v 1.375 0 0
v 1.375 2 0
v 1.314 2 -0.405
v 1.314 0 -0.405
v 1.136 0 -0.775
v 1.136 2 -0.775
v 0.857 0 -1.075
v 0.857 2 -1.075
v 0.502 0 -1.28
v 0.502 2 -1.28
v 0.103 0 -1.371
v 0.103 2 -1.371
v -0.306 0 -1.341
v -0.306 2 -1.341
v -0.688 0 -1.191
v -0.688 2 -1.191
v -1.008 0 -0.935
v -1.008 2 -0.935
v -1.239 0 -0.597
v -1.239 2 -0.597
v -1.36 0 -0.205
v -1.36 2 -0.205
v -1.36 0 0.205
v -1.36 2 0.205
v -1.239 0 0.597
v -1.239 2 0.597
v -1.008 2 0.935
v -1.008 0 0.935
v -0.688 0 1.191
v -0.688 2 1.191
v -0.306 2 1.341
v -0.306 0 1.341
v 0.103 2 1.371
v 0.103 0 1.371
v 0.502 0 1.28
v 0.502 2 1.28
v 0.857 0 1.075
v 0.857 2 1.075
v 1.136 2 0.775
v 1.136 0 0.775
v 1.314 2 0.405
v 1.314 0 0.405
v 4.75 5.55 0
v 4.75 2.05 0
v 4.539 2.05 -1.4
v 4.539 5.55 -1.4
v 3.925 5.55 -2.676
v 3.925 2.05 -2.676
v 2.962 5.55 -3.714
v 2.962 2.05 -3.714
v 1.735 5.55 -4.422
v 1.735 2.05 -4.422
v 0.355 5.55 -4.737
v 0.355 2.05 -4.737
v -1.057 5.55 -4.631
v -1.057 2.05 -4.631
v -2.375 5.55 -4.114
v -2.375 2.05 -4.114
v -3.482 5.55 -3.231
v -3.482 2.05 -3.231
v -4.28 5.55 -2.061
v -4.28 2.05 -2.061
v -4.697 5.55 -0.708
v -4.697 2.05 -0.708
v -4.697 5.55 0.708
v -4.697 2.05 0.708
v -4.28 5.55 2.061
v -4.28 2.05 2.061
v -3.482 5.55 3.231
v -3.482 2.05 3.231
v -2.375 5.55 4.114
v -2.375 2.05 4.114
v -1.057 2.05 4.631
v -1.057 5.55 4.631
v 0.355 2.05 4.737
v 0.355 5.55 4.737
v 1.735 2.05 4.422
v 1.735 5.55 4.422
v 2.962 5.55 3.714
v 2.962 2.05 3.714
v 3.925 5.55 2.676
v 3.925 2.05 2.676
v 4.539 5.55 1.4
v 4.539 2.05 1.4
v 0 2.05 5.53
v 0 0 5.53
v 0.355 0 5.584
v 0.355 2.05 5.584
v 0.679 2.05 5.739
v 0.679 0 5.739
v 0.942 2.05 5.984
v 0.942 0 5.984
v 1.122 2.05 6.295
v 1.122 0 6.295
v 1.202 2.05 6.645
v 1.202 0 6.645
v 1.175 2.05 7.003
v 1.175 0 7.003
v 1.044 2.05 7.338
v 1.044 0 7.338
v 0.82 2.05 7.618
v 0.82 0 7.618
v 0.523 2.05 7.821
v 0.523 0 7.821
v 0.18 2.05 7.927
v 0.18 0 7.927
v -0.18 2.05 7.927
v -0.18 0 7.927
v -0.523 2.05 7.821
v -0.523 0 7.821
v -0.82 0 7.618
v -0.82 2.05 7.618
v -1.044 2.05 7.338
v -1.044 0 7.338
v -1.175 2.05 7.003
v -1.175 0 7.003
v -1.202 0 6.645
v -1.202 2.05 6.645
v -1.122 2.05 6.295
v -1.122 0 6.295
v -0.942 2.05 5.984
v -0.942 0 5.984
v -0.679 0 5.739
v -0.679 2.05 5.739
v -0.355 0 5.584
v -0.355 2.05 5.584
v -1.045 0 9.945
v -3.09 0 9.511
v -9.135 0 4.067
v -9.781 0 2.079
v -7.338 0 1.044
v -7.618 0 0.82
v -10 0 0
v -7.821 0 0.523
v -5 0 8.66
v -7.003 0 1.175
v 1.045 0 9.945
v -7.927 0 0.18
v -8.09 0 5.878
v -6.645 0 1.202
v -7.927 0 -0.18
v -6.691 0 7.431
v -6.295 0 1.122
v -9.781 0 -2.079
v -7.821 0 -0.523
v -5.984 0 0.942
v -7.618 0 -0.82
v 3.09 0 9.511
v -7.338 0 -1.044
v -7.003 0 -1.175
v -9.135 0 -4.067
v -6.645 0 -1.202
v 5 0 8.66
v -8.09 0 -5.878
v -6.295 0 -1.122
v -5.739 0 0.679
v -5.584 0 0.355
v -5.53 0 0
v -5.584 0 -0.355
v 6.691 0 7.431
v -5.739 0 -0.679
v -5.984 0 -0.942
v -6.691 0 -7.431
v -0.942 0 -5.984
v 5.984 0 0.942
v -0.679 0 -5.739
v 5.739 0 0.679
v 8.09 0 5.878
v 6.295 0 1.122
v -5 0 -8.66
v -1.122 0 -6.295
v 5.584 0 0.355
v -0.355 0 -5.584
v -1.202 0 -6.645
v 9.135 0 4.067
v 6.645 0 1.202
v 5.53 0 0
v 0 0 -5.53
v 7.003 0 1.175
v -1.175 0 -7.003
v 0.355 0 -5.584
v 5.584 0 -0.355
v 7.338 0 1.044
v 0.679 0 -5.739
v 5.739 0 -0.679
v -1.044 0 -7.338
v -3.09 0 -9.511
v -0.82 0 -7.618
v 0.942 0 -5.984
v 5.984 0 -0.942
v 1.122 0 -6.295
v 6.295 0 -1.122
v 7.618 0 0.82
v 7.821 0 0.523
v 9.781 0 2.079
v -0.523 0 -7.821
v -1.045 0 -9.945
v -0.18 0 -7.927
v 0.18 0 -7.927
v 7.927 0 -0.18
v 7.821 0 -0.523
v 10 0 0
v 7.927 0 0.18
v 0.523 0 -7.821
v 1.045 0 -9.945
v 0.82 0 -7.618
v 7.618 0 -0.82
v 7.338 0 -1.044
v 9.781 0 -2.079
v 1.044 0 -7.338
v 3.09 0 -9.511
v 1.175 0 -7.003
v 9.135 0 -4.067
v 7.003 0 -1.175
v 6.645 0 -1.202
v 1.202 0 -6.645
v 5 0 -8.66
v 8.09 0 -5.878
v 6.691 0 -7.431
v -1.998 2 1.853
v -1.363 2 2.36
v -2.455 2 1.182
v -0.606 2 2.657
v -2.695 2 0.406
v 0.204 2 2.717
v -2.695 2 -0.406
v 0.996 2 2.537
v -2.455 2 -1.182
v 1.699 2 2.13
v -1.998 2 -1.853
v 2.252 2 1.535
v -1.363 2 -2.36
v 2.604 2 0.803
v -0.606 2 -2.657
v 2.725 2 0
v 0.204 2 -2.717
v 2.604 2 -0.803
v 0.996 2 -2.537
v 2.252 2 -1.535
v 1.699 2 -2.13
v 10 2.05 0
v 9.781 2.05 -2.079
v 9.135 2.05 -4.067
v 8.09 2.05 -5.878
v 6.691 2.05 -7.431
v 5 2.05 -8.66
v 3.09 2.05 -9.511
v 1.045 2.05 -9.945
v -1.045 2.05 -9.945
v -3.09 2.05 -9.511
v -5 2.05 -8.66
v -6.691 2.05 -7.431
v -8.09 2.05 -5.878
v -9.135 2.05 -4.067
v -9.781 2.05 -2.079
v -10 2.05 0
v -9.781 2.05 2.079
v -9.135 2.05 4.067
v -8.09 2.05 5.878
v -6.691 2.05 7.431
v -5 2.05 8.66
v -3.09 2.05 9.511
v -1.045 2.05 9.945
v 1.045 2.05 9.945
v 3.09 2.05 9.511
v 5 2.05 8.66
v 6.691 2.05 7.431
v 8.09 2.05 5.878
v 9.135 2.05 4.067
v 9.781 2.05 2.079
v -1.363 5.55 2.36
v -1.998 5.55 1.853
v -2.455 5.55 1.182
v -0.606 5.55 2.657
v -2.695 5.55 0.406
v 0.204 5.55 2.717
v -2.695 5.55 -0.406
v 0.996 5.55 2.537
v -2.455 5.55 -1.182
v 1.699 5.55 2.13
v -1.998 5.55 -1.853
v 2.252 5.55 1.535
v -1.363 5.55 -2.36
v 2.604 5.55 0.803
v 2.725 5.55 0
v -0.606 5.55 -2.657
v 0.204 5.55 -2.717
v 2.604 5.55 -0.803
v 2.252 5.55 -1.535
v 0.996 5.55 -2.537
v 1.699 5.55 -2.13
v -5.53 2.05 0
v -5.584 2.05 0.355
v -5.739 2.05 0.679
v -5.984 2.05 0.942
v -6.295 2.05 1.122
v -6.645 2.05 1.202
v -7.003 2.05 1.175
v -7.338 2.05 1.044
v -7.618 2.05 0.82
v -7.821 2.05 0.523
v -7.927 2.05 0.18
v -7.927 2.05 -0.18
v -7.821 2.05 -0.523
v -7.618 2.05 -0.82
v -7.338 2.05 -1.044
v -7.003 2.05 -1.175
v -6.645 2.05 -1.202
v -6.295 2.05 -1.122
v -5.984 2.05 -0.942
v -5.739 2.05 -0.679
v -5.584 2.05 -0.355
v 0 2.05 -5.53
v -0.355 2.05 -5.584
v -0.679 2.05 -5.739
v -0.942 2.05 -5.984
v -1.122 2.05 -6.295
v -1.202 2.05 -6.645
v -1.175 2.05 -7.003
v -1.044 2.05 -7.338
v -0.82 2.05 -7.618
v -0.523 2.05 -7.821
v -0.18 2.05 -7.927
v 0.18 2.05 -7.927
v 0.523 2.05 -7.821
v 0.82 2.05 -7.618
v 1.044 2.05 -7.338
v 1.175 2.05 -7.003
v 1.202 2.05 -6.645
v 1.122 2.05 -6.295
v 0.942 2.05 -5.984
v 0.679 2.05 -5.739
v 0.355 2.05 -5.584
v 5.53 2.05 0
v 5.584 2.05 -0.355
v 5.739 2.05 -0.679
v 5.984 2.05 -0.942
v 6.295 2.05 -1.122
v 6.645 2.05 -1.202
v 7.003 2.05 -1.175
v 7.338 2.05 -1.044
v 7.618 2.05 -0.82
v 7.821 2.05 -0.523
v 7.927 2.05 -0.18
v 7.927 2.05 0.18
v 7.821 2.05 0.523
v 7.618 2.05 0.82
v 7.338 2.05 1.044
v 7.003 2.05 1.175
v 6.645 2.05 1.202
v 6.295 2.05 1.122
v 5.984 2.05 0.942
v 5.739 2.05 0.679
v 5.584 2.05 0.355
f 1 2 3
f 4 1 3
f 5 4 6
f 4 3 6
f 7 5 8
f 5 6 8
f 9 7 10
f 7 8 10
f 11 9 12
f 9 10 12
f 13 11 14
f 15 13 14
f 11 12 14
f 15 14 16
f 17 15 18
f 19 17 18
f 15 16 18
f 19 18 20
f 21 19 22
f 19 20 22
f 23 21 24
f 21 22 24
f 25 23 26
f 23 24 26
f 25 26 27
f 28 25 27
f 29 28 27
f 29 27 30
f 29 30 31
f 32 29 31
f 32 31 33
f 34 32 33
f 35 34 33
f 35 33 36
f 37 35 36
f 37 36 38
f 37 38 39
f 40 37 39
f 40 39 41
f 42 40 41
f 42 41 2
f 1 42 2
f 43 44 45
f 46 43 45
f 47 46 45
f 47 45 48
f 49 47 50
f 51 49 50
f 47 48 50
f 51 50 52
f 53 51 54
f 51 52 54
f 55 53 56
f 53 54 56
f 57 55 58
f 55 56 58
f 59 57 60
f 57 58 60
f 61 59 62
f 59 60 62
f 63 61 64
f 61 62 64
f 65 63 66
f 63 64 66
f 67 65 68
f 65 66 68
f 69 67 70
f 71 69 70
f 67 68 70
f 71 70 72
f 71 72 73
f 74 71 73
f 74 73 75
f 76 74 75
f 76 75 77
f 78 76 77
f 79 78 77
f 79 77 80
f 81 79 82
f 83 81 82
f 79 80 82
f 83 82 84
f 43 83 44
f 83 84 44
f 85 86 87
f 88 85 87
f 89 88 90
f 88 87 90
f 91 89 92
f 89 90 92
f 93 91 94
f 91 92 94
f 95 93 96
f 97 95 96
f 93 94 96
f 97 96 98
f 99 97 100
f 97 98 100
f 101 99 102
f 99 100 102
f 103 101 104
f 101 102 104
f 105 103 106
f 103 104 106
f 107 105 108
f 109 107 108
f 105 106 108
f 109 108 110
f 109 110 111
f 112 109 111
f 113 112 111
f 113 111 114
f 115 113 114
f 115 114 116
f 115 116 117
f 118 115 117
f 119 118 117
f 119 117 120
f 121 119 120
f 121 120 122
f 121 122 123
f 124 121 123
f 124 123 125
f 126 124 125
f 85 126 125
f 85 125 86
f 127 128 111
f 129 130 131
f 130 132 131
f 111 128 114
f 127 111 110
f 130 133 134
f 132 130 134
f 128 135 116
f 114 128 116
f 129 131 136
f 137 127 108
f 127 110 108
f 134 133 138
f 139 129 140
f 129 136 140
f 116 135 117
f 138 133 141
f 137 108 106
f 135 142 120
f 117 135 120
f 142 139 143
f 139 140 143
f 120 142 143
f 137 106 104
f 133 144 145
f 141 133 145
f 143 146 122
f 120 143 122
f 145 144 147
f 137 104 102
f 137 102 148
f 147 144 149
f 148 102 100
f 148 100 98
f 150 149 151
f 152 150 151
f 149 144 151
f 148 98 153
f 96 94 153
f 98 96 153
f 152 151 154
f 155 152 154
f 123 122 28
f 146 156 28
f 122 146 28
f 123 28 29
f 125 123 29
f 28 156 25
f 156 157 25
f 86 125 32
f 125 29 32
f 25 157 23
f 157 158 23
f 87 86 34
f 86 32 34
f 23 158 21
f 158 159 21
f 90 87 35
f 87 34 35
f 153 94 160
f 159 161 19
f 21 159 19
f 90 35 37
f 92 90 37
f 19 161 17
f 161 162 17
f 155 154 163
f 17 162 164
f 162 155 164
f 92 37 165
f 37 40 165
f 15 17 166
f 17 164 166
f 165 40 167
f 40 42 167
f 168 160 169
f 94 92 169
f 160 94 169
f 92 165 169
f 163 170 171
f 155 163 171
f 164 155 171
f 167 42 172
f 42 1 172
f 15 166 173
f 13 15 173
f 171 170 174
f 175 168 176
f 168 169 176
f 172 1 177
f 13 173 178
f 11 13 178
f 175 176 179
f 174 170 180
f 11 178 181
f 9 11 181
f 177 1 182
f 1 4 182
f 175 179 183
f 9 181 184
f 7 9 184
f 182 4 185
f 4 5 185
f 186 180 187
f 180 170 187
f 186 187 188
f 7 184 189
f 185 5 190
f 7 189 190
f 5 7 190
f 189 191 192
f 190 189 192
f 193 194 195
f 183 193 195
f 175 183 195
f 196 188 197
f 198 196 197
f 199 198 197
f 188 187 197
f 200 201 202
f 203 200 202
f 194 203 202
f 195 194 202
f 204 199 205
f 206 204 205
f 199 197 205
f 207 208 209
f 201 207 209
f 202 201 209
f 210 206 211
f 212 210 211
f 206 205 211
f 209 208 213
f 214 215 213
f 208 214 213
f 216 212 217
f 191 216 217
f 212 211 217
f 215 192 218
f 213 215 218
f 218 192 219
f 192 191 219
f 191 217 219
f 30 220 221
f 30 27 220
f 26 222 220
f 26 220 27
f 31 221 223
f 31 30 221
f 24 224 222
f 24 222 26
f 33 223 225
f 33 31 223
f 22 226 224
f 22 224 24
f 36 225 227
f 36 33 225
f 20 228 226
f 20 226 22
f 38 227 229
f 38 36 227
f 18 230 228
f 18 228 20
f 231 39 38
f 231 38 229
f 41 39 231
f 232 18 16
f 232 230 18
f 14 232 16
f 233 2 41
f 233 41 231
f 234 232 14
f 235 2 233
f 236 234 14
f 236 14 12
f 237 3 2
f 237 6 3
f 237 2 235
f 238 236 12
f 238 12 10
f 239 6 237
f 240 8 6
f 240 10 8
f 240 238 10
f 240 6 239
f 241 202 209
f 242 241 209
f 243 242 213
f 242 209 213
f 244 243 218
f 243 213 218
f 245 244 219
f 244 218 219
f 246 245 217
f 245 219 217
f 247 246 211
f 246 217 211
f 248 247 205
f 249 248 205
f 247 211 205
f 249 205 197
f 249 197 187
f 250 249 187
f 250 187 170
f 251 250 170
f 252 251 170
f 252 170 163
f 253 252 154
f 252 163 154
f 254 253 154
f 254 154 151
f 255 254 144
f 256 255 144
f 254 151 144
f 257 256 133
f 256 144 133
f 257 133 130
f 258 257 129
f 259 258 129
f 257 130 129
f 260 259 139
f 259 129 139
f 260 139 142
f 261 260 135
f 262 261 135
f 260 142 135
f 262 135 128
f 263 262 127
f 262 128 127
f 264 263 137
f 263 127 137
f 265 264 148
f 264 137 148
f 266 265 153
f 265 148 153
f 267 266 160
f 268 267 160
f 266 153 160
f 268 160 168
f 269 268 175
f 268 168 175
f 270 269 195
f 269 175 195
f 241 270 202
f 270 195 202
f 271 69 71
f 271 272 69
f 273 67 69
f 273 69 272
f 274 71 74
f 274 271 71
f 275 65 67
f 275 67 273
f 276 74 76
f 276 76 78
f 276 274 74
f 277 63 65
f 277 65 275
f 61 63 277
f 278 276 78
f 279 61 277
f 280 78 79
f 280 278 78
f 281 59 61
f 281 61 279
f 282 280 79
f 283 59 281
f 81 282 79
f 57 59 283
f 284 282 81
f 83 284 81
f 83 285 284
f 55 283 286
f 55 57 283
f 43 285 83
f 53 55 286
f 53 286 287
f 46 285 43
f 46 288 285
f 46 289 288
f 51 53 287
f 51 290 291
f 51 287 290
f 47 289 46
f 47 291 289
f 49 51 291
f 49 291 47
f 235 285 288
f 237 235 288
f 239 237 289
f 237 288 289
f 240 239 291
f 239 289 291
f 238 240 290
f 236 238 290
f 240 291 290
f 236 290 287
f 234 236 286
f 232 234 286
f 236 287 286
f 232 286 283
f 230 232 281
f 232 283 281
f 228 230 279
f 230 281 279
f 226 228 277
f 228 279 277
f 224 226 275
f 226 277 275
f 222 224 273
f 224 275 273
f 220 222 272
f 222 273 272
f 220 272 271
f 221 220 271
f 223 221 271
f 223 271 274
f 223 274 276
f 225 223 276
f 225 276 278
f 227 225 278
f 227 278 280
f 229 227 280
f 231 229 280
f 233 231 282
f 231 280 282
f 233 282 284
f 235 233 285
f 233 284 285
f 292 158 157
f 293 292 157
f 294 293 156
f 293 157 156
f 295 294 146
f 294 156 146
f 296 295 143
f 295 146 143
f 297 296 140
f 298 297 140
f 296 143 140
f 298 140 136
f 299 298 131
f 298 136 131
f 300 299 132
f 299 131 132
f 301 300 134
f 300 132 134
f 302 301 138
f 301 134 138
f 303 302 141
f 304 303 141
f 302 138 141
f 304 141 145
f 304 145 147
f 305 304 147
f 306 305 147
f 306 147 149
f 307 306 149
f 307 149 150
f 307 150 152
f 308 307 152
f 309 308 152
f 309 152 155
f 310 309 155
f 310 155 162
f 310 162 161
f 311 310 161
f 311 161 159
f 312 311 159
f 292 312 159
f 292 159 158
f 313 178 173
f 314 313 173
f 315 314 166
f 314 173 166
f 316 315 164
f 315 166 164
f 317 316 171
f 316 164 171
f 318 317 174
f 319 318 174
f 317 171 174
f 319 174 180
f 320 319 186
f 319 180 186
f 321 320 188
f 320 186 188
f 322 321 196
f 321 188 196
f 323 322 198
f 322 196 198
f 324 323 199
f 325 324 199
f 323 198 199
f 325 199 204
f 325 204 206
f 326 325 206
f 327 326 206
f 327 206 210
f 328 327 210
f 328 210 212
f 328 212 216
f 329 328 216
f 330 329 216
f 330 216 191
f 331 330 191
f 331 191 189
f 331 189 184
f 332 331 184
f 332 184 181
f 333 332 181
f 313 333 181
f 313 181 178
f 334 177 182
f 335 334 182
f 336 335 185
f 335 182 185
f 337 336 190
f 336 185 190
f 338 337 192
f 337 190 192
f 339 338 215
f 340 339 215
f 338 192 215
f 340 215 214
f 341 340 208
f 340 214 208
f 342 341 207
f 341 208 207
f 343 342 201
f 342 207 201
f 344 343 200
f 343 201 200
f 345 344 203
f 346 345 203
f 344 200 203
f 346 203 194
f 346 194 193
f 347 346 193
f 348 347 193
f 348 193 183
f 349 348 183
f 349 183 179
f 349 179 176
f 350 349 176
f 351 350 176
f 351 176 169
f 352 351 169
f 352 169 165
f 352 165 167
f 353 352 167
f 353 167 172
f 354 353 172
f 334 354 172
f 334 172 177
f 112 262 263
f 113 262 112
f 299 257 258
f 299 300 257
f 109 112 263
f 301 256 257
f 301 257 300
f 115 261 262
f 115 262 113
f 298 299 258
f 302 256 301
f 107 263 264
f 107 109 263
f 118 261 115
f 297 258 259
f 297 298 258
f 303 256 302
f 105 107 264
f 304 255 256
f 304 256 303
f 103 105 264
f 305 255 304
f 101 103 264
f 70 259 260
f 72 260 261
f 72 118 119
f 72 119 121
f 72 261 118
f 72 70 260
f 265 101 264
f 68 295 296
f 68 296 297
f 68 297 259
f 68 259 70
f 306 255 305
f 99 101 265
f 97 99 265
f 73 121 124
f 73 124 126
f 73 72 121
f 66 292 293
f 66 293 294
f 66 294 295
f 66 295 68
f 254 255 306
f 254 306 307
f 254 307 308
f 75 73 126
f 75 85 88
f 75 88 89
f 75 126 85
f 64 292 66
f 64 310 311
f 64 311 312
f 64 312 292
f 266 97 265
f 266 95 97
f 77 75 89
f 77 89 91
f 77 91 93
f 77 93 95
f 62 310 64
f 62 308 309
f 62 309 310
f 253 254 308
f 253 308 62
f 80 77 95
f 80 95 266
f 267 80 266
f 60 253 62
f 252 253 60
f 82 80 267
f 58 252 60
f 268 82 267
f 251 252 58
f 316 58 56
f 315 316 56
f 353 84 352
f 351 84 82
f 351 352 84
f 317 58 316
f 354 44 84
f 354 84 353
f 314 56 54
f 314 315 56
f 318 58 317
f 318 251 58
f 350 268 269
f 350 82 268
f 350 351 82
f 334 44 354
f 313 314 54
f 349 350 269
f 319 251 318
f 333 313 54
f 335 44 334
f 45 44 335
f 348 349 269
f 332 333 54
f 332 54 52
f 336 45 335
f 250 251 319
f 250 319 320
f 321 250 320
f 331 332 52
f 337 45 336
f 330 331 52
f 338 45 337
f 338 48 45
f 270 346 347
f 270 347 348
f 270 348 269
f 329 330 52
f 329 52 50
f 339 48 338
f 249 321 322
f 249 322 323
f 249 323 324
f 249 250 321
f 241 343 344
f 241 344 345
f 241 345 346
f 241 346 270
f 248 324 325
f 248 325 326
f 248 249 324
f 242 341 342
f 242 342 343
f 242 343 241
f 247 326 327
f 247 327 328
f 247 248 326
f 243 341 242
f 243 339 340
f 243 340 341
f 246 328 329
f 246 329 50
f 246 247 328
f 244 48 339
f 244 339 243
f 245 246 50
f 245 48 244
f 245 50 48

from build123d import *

# Parameters (mm, degrees)
SKETCH1_R           = 10
BOSS_EXTRUDE1_DEPTH = 2.05
SKETCH2_R           = 4.75
BOSS_EXTRUDE2_DEPTH = 3.5
SKETCH3_R           = 2.725
CUT_EXTRUDE1_DEPTH  = 3.55
SKETCH4_R           = 1.375
CUT_EXTRUDE2_DEPTH  = 3.55
SKETCH5_R           = 1.205
CUT_EXTRUDE3_DEPTH  = 3.55
CIRPATTERN1_COUNT   = 4


with BuildPart() as part:
    # Sketch1 → Boss-Extrude1 (new body)
    with BuildSketch(Plane(origin=(0, 0, 0), x_dir=(1, 0, 0), z_dir=(0, 1, 0))):
        Circle(SKETCH1_R)
    extrude(amount=BOSS_EXTRUDE1_DEPTH)

    # Sketch2 → Boss-Extrude2 (add)
    with BuildSketch(Plane(origin=(0, 2.05, 0), x_dir=(1, 0, 0), z_dir=(0, 1, 0))):
        Circle(SKETCH2_R)
    extrude(amount=BOSS_EXTRUDE2_DEPTH)

    # Sketch3 → Cut-Extrude1 (cut)
    with BuildSketch(Plane(origin=(0, 5.55, 0), x_dir=(1, 0, 0), z_dir=(0, 1, 0))):
        Circle(SKETCH3_R)
    extrude(amount=-CUT_EXTRUDE1_DEPTH, mode=Mode.SUBTRACT)

    # Sketch4 → Cut-Extrude2 (cut)
    with BuildSketch(Plane(origin=(0, 2, 0), x_dir=(1, 0, 0), z_dir=(0, 1, 0))):
        Circle(SKETCH4_R)
    extrude(amount=-CUT_EXTRUDE2_DEPTH, mode=Mode.SUBTRACT)

    # Sketch5 → Cut-Extrude3 (cut)
    with BuildSketch(Plane.XZ):
        with Locations((-6.735, 0)):
            Circle(SKETCH5_R)
    cut_extrude3 = extrude(amount=-CUT_EXTRUDE3_DEPTH, mode=Mode.SUBTRACT)

    # CirPattern1: Cut-Extrude3 ×4 about axis
    cirpattern1_axis = Axis((0, 0, 0), (0, 1, 0))
    for i in range(1, CIRPATTERN1_COUNT):
        add(cut_extrude3.rotate(cirpattern1_axis, i * 360 / CIRPATTERN1_COUNT), mode=Mode.SUBTRACT)


solid = part.part
